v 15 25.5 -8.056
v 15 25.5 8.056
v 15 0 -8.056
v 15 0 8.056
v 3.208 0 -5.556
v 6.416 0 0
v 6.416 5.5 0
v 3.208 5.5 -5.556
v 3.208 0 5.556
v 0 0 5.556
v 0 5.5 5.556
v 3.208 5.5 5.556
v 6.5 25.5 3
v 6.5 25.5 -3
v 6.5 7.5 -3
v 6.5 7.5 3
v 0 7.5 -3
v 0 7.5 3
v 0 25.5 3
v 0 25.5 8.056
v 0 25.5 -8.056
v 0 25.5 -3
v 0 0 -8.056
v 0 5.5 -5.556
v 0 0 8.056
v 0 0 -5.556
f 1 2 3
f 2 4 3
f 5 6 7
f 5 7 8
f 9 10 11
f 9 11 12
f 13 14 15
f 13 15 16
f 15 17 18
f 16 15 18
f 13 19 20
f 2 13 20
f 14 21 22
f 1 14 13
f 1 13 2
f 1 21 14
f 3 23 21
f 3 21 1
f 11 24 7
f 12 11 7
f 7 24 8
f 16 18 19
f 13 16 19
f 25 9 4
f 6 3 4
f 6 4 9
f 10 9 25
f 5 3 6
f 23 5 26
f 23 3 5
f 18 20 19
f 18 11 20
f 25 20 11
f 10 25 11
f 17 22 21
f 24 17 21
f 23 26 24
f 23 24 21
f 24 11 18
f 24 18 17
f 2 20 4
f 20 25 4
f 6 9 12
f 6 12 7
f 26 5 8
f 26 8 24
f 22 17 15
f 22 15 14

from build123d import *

# Parameters (mm, degrees)
BOSS_EXTRUDE1_DEPTH = 5.5
SKETCH2_W           = 15
SKETCH2_H           = 16.1125
BOSS_EXTRUDE2_DEPTH = 20
SKETCH3_W           = 6
SKETCH3_H           = 18
CUT_EXTRUDE1_DEPTH  = 6.5


with BuildPart() as part:
    # Sketch1 → Boss-Extrude1 (new body)
    with BuildSketch(Plane(origin=(0, 0, 0), x_dir=(1, 0, 0), z_dir=(0, 1, 0))):
        Polygon((0, 5.55625), (0, 8.05625), (15, 8.05625), (15, -8.05625), (0, -8.05625), (0, -5.55625), (3.207902433, -5.55625), (6.415804866, 0), (3.207902433, 5.55625), align=None)
    extrude(amount=BOSS_EXTRUDE1_DEPTH)

    # Sketch2 → Boss-Extrude2 (add)
    with BuildSketch(Plane(origin=(0, 5.5, 0), x_dir=(1, 0, 0), z_dir=(0, 1, 0))):
        with Locations((7.5, 0)):
            Rectangle(SKETCH2_W, SKETCH2_H)
    extrude(amount=BOSS_EXTRUDE2_DEPTH)

    # Sketch3 → Cut-Extrude1 (cut)
    with BuildSketch(Plane.ZY):
        with Locations((0, 16.5)):
            Rectangle(SKETCH3_W, SKETCH3_H)
    extrude(amount=-CUT_EXTRUDE1_DEPTH, mode=Mode.SUBTRACT)


solid = part.part
